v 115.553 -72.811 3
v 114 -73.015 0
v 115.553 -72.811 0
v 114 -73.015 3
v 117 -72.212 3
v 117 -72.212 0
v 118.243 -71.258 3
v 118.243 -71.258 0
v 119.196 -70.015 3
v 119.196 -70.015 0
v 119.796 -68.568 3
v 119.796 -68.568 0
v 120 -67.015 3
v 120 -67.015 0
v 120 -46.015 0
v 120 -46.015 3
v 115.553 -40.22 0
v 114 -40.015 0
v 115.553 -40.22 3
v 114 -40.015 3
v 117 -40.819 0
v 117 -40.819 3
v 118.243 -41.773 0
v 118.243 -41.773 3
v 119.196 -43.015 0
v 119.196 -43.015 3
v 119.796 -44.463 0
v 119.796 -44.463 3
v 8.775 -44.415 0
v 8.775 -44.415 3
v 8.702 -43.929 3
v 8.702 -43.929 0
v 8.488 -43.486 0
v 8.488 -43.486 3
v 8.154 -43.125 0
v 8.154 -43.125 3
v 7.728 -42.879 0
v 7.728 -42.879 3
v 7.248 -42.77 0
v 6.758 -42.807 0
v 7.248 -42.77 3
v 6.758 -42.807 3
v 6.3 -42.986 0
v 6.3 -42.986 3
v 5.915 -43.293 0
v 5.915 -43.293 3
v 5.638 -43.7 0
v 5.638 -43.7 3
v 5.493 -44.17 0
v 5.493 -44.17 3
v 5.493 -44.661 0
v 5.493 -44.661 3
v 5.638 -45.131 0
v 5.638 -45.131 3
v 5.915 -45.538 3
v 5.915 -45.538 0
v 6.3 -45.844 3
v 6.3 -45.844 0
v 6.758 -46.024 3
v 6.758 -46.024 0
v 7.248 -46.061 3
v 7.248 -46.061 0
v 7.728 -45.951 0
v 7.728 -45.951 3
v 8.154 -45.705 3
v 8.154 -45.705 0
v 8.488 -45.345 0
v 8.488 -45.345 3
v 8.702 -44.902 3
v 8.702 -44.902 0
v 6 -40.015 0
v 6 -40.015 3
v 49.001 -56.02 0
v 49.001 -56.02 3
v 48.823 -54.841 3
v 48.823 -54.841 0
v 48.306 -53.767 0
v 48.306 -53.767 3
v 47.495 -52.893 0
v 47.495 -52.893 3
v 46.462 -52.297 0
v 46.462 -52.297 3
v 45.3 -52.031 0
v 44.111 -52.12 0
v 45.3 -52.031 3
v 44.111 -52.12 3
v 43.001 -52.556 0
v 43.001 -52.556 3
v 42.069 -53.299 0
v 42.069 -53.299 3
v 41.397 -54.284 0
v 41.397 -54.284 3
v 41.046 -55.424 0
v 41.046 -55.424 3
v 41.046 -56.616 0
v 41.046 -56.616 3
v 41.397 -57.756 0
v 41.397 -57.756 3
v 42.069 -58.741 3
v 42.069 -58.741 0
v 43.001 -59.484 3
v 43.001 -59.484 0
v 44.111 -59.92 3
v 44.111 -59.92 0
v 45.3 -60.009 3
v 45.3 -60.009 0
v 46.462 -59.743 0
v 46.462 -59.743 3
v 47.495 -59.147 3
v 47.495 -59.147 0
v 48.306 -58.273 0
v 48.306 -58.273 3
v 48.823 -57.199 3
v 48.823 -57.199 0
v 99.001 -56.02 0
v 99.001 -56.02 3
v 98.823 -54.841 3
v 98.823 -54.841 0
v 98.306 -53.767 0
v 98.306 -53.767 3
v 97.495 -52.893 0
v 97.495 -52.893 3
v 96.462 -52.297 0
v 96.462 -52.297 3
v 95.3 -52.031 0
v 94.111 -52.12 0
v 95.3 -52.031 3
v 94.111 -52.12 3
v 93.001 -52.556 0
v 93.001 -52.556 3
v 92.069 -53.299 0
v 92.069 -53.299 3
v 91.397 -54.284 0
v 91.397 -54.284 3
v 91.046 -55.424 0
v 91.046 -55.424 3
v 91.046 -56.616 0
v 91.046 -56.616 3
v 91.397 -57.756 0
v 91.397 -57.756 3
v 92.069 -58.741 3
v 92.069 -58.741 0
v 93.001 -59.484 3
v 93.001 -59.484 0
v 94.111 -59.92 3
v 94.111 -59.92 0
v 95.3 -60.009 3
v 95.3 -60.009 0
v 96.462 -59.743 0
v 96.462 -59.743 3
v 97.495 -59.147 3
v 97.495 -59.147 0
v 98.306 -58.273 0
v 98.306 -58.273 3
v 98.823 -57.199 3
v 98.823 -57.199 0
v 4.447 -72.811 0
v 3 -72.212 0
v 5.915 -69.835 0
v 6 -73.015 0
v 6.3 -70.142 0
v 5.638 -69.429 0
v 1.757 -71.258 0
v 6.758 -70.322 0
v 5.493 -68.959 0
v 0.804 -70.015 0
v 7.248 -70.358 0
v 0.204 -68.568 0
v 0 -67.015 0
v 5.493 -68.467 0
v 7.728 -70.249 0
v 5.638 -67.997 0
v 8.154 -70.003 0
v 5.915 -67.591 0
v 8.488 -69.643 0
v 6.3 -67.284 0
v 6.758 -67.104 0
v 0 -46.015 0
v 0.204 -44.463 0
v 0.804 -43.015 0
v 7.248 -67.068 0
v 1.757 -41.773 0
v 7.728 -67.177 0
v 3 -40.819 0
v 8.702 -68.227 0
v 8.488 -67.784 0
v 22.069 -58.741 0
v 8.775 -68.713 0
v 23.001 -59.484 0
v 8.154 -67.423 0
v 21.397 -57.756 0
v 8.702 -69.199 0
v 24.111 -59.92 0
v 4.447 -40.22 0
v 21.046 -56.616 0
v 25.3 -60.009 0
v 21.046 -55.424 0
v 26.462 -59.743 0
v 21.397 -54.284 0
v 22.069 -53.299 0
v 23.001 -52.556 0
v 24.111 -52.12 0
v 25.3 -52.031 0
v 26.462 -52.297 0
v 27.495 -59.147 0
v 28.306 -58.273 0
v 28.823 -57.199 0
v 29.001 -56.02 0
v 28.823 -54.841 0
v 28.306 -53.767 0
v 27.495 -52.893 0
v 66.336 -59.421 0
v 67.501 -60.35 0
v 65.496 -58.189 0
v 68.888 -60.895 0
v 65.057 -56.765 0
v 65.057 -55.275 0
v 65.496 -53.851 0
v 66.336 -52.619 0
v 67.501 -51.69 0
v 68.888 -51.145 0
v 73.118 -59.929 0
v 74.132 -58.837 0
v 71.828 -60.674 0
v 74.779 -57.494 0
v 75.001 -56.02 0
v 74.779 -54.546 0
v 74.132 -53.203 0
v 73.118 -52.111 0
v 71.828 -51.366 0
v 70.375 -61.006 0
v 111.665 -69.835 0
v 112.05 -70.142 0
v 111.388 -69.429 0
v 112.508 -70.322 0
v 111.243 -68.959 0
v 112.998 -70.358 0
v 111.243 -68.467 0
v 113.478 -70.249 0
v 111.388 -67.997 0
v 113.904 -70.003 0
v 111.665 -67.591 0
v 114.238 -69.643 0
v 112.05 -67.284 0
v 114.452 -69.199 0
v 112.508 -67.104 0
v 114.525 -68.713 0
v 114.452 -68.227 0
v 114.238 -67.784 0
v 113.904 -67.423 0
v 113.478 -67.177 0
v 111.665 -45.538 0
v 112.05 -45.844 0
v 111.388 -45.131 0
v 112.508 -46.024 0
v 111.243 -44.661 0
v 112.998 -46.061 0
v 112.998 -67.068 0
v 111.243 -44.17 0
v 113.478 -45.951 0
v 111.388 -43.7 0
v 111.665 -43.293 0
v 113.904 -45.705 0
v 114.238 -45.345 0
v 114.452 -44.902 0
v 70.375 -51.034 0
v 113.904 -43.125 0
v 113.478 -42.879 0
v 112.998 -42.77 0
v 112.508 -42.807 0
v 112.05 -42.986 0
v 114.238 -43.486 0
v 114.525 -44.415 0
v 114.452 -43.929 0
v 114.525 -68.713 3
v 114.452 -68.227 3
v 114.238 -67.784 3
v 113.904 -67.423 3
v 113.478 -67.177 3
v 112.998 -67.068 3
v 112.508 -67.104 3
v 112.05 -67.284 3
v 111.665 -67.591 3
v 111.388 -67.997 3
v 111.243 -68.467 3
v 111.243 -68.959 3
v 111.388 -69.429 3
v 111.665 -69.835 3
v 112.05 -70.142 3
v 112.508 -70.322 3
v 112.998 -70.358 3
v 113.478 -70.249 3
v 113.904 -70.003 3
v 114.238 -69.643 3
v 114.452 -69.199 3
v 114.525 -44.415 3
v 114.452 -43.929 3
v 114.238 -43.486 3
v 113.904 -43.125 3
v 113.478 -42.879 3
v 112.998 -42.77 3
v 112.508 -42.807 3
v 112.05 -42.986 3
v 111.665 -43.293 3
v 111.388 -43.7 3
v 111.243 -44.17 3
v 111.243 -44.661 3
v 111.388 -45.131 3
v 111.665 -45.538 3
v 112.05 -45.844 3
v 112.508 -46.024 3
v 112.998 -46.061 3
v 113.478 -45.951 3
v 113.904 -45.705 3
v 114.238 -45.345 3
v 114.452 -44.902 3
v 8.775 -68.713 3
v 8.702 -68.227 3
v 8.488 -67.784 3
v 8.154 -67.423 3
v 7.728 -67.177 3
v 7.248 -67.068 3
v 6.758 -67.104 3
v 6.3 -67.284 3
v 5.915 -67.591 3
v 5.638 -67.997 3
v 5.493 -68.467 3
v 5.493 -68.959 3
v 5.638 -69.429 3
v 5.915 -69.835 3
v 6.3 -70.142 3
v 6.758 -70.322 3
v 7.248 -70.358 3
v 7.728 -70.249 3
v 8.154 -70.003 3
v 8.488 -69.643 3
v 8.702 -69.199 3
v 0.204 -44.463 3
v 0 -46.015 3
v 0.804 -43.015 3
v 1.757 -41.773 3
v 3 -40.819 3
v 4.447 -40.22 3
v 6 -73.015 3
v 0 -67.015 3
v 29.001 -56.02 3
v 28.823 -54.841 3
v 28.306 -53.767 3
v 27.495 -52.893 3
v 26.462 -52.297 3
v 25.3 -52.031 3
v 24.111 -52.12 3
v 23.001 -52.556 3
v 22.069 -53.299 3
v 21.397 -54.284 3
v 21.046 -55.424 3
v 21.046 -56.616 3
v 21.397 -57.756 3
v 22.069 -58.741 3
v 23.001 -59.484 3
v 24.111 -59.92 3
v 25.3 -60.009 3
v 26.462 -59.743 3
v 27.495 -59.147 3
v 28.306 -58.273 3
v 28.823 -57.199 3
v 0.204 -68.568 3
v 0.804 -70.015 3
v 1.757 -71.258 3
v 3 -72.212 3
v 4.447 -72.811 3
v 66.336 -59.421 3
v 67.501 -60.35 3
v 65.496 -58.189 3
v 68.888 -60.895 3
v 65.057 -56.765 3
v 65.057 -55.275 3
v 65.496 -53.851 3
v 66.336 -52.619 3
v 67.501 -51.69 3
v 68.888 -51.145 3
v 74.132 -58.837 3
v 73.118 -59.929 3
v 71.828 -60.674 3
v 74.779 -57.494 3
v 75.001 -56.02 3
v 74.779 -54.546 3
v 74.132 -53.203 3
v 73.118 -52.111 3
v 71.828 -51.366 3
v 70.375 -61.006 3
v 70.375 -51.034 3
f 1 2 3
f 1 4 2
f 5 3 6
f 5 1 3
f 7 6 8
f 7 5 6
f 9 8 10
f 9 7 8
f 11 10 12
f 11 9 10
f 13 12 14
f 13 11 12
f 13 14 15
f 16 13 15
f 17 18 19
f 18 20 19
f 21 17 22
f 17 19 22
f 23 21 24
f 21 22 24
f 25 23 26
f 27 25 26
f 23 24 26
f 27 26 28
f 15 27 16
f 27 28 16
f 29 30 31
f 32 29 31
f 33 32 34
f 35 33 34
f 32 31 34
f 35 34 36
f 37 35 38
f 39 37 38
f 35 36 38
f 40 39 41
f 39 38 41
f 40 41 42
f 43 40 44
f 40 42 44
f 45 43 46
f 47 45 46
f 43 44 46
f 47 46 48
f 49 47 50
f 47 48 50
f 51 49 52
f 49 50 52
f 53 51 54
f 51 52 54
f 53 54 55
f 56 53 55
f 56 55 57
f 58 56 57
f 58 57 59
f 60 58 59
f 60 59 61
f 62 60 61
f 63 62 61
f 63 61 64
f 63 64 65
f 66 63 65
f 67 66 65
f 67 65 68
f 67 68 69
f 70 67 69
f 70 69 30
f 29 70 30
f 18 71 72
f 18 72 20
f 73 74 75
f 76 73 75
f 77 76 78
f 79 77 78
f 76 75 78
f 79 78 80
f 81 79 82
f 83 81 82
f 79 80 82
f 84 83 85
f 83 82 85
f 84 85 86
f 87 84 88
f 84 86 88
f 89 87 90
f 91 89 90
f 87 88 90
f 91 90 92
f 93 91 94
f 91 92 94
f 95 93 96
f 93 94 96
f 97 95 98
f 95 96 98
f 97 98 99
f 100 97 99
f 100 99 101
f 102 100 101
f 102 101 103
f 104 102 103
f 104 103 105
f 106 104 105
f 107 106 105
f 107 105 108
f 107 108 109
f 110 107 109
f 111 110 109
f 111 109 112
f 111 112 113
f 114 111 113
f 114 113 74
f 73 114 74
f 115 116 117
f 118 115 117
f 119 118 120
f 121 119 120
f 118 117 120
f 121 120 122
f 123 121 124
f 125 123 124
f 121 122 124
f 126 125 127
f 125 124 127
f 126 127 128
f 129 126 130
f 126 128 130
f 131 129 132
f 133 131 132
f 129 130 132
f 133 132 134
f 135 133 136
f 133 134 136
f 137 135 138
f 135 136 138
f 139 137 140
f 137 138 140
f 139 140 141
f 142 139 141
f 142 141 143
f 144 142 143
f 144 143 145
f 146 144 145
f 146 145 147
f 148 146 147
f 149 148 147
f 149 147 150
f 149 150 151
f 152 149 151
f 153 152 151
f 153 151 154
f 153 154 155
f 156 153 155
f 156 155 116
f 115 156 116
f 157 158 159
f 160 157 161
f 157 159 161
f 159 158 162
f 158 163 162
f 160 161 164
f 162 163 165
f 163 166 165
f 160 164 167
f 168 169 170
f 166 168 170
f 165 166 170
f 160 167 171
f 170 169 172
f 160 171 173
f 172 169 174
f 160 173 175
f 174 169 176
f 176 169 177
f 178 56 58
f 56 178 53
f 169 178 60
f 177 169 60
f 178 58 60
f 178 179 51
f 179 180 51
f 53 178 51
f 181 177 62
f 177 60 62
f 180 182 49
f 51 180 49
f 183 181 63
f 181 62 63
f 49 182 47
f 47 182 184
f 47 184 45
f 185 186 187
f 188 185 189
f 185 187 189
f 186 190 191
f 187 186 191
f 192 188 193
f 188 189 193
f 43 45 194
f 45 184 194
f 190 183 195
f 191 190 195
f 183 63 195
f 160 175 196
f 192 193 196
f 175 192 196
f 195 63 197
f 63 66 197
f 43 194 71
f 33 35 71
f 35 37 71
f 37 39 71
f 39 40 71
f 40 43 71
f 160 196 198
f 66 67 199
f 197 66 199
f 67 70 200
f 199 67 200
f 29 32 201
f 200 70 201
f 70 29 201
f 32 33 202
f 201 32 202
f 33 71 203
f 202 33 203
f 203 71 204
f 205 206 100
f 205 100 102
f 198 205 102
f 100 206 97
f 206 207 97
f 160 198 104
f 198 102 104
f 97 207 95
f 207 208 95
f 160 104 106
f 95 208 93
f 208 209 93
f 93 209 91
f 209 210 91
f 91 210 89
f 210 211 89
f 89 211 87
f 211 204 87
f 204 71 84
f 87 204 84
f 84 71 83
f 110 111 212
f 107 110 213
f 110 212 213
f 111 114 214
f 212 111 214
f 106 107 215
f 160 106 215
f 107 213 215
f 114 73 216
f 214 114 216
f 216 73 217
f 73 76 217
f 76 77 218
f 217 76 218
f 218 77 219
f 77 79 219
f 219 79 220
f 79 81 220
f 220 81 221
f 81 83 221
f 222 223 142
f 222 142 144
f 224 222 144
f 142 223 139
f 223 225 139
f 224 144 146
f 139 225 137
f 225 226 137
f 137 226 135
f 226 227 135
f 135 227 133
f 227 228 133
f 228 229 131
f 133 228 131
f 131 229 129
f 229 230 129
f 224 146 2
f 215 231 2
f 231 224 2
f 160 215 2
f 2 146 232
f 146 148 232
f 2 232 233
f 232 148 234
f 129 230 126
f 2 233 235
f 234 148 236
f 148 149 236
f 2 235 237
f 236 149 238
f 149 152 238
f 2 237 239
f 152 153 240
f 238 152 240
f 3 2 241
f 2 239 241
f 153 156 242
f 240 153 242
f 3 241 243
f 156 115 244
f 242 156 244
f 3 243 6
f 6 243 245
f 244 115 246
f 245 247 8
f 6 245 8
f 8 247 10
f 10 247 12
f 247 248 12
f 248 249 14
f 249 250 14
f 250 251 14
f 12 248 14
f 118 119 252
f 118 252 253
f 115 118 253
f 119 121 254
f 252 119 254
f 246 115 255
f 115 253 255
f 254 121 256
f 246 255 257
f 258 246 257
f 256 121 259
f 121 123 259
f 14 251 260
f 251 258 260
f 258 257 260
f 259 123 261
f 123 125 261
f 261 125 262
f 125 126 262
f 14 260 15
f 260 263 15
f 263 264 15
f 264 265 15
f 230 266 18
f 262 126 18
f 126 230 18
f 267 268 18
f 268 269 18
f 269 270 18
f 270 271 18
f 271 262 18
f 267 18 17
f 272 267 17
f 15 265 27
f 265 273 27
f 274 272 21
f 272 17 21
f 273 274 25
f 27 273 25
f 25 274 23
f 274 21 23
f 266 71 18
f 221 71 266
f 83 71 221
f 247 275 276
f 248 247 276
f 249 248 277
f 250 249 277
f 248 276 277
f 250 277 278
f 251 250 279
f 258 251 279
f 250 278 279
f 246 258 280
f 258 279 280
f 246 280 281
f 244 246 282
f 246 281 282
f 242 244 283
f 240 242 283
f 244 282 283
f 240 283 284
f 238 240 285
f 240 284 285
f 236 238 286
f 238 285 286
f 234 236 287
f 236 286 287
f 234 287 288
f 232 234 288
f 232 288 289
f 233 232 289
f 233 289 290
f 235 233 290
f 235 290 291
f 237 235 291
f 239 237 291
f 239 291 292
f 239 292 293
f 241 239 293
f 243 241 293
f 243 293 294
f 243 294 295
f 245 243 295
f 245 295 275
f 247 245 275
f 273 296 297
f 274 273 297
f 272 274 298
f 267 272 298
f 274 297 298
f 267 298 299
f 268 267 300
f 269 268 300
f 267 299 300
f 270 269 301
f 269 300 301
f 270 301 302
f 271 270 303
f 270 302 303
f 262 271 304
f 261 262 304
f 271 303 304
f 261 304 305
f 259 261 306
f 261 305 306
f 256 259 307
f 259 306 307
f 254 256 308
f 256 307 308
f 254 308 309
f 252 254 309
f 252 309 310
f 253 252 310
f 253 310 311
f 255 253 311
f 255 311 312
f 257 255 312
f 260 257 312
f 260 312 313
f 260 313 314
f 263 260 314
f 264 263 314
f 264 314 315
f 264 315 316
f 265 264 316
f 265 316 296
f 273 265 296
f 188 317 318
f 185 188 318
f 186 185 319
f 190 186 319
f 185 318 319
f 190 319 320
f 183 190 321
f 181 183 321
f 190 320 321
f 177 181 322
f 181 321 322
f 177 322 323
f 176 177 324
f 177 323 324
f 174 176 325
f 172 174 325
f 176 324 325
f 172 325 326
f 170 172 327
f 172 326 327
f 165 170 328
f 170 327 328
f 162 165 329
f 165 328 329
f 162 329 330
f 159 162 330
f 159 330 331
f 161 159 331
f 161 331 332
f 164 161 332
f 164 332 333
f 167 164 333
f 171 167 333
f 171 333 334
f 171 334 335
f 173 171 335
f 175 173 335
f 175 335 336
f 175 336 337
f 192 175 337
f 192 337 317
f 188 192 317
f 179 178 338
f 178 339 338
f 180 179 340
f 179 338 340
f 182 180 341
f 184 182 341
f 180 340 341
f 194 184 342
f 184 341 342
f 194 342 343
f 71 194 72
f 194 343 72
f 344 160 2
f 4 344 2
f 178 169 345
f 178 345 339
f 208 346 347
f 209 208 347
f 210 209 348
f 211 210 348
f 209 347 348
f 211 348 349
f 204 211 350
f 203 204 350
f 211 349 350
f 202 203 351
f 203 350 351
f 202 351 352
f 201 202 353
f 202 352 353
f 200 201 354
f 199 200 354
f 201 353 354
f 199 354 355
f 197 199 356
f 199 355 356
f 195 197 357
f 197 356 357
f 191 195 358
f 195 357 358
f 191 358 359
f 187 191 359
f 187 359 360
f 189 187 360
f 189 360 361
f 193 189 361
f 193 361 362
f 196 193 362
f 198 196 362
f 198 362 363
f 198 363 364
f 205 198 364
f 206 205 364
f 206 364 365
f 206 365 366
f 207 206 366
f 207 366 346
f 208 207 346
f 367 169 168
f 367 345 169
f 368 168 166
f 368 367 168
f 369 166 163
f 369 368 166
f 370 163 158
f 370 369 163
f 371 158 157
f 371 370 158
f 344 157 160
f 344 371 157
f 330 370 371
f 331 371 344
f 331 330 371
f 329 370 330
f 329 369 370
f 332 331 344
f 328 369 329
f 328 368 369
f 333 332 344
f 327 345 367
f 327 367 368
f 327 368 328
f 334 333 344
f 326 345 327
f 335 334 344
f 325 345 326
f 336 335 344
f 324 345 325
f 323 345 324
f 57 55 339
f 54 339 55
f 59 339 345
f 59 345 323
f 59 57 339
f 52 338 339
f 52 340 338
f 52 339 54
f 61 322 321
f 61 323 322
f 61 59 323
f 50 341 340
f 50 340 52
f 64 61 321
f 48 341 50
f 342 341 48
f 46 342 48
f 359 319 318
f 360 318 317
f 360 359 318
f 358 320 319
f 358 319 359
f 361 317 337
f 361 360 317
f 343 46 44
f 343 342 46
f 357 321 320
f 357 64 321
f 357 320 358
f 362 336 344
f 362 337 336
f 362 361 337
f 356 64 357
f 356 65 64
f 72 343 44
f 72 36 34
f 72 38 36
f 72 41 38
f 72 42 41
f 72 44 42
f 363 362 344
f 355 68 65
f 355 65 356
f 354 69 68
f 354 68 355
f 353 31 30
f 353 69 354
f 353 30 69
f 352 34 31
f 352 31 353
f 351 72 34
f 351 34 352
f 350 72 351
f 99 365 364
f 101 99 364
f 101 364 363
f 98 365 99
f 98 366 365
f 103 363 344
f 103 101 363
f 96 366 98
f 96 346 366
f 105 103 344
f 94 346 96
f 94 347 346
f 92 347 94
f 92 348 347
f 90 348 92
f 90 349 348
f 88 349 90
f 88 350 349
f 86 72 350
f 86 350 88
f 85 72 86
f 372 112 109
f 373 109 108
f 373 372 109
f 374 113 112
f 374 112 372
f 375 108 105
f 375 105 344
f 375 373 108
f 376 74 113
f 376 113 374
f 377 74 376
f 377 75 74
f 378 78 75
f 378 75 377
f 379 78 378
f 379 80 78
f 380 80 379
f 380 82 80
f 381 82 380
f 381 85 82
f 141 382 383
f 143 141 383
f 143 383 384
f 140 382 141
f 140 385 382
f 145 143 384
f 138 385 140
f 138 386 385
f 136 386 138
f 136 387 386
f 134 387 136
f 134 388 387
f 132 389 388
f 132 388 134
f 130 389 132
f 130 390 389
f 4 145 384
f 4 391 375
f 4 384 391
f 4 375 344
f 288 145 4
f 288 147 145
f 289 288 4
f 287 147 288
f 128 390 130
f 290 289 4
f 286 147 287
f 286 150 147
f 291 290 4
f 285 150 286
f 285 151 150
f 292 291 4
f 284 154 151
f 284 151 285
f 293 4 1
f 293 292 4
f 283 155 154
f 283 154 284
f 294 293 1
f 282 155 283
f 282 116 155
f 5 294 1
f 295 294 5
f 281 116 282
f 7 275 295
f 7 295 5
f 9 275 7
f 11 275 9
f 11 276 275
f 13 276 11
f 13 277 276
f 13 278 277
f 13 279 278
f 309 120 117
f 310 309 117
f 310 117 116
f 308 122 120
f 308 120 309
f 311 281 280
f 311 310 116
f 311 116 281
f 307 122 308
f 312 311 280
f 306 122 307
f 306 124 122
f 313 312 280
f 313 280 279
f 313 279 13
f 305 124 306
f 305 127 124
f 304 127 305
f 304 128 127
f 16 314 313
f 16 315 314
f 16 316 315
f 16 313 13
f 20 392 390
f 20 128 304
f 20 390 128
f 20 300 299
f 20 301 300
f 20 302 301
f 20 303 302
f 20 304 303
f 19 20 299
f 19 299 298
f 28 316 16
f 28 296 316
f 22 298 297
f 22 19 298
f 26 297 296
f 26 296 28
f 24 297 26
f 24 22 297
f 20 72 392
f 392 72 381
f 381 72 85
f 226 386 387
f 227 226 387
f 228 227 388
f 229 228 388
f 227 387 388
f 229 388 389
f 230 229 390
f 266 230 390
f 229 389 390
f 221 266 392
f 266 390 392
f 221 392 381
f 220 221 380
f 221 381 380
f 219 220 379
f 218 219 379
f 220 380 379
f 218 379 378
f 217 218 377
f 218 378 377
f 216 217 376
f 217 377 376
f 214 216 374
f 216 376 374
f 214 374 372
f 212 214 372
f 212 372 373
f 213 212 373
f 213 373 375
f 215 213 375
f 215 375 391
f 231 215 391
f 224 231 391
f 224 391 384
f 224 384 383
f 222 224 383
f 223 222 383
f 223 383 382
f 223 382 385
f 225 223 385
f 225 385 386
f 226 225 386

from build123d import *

# Parameters (mm, degrees)
SKETCH_W        = 120
SKETCH_H        = 33
PAD_DEPTH       = 3
SKETCH195_R     = 4
SKETCH195_R_2   = 5
POCKET_DEPTH    = 5
SKETCH196_R     = 1.65
POCKET137_DEPTH = 5
FILLET_R        = 6


with BuildPart() as part:
    # Sketch → Pad (new body)
    with BuildSketch(Plane.XY):
        with Locations((60, -56.515431)):
            Rectangle(SKETCH_W, SKETCH_H)
    extrude(amount=PAD_DEPTH)

    # Sketch195 (on Face6 of Pad) → Pocket (cut)
    with BuildSketch(Plane.XY.offset(3)):
        with Locations((25.000934, -56.019999)):
            Circle(SKETCH195_R)
        with Locations((45.000934, -56.019999)):
            Circle(SKETCH195_R)
        with Locations((70.000934, -56.019999)):
            Circle(SKETCH195_R_2)
        with Locations((95.000934, -56.019999)):
            Circle(SKETCH195_R)
    extrude(amount=-POCKET_DEPTH, mode=Mode.SUBTRACT)

    # Sketch196 (on Face5 of Pocket) → Pocket137 (cut)
    with BuildSketch(Plane.XY.offset(3)):
        with Locations((7.125, -44.415438)):
            Circle(SKETCH196_R)
        with Locations((112.875, -68.713068)):
            Circle(SKETCH196_R)
        with Locations((112.875, -44.415438)):
            Circle(SKETCH196_R)
        with Locations((7.125, -68.713068)):
            Circle(SKETCH196_R)
    extrude(amount=-POCKET137_DEPTH, mode=Mode.SUBTRACT)

    # Fillet
    fillet_edges = [part.edges().sort_by_distance(p)[0] for p in [
        (0, -73.015431, 1.5),
        (0, -40.015431, 1.5),
        (120, -73.015431, 1.5),
        (120, -40.015431, 1.5),
    ]]
    fillet(fillet_edges, radius=FILLET_R)


solid = part.part
